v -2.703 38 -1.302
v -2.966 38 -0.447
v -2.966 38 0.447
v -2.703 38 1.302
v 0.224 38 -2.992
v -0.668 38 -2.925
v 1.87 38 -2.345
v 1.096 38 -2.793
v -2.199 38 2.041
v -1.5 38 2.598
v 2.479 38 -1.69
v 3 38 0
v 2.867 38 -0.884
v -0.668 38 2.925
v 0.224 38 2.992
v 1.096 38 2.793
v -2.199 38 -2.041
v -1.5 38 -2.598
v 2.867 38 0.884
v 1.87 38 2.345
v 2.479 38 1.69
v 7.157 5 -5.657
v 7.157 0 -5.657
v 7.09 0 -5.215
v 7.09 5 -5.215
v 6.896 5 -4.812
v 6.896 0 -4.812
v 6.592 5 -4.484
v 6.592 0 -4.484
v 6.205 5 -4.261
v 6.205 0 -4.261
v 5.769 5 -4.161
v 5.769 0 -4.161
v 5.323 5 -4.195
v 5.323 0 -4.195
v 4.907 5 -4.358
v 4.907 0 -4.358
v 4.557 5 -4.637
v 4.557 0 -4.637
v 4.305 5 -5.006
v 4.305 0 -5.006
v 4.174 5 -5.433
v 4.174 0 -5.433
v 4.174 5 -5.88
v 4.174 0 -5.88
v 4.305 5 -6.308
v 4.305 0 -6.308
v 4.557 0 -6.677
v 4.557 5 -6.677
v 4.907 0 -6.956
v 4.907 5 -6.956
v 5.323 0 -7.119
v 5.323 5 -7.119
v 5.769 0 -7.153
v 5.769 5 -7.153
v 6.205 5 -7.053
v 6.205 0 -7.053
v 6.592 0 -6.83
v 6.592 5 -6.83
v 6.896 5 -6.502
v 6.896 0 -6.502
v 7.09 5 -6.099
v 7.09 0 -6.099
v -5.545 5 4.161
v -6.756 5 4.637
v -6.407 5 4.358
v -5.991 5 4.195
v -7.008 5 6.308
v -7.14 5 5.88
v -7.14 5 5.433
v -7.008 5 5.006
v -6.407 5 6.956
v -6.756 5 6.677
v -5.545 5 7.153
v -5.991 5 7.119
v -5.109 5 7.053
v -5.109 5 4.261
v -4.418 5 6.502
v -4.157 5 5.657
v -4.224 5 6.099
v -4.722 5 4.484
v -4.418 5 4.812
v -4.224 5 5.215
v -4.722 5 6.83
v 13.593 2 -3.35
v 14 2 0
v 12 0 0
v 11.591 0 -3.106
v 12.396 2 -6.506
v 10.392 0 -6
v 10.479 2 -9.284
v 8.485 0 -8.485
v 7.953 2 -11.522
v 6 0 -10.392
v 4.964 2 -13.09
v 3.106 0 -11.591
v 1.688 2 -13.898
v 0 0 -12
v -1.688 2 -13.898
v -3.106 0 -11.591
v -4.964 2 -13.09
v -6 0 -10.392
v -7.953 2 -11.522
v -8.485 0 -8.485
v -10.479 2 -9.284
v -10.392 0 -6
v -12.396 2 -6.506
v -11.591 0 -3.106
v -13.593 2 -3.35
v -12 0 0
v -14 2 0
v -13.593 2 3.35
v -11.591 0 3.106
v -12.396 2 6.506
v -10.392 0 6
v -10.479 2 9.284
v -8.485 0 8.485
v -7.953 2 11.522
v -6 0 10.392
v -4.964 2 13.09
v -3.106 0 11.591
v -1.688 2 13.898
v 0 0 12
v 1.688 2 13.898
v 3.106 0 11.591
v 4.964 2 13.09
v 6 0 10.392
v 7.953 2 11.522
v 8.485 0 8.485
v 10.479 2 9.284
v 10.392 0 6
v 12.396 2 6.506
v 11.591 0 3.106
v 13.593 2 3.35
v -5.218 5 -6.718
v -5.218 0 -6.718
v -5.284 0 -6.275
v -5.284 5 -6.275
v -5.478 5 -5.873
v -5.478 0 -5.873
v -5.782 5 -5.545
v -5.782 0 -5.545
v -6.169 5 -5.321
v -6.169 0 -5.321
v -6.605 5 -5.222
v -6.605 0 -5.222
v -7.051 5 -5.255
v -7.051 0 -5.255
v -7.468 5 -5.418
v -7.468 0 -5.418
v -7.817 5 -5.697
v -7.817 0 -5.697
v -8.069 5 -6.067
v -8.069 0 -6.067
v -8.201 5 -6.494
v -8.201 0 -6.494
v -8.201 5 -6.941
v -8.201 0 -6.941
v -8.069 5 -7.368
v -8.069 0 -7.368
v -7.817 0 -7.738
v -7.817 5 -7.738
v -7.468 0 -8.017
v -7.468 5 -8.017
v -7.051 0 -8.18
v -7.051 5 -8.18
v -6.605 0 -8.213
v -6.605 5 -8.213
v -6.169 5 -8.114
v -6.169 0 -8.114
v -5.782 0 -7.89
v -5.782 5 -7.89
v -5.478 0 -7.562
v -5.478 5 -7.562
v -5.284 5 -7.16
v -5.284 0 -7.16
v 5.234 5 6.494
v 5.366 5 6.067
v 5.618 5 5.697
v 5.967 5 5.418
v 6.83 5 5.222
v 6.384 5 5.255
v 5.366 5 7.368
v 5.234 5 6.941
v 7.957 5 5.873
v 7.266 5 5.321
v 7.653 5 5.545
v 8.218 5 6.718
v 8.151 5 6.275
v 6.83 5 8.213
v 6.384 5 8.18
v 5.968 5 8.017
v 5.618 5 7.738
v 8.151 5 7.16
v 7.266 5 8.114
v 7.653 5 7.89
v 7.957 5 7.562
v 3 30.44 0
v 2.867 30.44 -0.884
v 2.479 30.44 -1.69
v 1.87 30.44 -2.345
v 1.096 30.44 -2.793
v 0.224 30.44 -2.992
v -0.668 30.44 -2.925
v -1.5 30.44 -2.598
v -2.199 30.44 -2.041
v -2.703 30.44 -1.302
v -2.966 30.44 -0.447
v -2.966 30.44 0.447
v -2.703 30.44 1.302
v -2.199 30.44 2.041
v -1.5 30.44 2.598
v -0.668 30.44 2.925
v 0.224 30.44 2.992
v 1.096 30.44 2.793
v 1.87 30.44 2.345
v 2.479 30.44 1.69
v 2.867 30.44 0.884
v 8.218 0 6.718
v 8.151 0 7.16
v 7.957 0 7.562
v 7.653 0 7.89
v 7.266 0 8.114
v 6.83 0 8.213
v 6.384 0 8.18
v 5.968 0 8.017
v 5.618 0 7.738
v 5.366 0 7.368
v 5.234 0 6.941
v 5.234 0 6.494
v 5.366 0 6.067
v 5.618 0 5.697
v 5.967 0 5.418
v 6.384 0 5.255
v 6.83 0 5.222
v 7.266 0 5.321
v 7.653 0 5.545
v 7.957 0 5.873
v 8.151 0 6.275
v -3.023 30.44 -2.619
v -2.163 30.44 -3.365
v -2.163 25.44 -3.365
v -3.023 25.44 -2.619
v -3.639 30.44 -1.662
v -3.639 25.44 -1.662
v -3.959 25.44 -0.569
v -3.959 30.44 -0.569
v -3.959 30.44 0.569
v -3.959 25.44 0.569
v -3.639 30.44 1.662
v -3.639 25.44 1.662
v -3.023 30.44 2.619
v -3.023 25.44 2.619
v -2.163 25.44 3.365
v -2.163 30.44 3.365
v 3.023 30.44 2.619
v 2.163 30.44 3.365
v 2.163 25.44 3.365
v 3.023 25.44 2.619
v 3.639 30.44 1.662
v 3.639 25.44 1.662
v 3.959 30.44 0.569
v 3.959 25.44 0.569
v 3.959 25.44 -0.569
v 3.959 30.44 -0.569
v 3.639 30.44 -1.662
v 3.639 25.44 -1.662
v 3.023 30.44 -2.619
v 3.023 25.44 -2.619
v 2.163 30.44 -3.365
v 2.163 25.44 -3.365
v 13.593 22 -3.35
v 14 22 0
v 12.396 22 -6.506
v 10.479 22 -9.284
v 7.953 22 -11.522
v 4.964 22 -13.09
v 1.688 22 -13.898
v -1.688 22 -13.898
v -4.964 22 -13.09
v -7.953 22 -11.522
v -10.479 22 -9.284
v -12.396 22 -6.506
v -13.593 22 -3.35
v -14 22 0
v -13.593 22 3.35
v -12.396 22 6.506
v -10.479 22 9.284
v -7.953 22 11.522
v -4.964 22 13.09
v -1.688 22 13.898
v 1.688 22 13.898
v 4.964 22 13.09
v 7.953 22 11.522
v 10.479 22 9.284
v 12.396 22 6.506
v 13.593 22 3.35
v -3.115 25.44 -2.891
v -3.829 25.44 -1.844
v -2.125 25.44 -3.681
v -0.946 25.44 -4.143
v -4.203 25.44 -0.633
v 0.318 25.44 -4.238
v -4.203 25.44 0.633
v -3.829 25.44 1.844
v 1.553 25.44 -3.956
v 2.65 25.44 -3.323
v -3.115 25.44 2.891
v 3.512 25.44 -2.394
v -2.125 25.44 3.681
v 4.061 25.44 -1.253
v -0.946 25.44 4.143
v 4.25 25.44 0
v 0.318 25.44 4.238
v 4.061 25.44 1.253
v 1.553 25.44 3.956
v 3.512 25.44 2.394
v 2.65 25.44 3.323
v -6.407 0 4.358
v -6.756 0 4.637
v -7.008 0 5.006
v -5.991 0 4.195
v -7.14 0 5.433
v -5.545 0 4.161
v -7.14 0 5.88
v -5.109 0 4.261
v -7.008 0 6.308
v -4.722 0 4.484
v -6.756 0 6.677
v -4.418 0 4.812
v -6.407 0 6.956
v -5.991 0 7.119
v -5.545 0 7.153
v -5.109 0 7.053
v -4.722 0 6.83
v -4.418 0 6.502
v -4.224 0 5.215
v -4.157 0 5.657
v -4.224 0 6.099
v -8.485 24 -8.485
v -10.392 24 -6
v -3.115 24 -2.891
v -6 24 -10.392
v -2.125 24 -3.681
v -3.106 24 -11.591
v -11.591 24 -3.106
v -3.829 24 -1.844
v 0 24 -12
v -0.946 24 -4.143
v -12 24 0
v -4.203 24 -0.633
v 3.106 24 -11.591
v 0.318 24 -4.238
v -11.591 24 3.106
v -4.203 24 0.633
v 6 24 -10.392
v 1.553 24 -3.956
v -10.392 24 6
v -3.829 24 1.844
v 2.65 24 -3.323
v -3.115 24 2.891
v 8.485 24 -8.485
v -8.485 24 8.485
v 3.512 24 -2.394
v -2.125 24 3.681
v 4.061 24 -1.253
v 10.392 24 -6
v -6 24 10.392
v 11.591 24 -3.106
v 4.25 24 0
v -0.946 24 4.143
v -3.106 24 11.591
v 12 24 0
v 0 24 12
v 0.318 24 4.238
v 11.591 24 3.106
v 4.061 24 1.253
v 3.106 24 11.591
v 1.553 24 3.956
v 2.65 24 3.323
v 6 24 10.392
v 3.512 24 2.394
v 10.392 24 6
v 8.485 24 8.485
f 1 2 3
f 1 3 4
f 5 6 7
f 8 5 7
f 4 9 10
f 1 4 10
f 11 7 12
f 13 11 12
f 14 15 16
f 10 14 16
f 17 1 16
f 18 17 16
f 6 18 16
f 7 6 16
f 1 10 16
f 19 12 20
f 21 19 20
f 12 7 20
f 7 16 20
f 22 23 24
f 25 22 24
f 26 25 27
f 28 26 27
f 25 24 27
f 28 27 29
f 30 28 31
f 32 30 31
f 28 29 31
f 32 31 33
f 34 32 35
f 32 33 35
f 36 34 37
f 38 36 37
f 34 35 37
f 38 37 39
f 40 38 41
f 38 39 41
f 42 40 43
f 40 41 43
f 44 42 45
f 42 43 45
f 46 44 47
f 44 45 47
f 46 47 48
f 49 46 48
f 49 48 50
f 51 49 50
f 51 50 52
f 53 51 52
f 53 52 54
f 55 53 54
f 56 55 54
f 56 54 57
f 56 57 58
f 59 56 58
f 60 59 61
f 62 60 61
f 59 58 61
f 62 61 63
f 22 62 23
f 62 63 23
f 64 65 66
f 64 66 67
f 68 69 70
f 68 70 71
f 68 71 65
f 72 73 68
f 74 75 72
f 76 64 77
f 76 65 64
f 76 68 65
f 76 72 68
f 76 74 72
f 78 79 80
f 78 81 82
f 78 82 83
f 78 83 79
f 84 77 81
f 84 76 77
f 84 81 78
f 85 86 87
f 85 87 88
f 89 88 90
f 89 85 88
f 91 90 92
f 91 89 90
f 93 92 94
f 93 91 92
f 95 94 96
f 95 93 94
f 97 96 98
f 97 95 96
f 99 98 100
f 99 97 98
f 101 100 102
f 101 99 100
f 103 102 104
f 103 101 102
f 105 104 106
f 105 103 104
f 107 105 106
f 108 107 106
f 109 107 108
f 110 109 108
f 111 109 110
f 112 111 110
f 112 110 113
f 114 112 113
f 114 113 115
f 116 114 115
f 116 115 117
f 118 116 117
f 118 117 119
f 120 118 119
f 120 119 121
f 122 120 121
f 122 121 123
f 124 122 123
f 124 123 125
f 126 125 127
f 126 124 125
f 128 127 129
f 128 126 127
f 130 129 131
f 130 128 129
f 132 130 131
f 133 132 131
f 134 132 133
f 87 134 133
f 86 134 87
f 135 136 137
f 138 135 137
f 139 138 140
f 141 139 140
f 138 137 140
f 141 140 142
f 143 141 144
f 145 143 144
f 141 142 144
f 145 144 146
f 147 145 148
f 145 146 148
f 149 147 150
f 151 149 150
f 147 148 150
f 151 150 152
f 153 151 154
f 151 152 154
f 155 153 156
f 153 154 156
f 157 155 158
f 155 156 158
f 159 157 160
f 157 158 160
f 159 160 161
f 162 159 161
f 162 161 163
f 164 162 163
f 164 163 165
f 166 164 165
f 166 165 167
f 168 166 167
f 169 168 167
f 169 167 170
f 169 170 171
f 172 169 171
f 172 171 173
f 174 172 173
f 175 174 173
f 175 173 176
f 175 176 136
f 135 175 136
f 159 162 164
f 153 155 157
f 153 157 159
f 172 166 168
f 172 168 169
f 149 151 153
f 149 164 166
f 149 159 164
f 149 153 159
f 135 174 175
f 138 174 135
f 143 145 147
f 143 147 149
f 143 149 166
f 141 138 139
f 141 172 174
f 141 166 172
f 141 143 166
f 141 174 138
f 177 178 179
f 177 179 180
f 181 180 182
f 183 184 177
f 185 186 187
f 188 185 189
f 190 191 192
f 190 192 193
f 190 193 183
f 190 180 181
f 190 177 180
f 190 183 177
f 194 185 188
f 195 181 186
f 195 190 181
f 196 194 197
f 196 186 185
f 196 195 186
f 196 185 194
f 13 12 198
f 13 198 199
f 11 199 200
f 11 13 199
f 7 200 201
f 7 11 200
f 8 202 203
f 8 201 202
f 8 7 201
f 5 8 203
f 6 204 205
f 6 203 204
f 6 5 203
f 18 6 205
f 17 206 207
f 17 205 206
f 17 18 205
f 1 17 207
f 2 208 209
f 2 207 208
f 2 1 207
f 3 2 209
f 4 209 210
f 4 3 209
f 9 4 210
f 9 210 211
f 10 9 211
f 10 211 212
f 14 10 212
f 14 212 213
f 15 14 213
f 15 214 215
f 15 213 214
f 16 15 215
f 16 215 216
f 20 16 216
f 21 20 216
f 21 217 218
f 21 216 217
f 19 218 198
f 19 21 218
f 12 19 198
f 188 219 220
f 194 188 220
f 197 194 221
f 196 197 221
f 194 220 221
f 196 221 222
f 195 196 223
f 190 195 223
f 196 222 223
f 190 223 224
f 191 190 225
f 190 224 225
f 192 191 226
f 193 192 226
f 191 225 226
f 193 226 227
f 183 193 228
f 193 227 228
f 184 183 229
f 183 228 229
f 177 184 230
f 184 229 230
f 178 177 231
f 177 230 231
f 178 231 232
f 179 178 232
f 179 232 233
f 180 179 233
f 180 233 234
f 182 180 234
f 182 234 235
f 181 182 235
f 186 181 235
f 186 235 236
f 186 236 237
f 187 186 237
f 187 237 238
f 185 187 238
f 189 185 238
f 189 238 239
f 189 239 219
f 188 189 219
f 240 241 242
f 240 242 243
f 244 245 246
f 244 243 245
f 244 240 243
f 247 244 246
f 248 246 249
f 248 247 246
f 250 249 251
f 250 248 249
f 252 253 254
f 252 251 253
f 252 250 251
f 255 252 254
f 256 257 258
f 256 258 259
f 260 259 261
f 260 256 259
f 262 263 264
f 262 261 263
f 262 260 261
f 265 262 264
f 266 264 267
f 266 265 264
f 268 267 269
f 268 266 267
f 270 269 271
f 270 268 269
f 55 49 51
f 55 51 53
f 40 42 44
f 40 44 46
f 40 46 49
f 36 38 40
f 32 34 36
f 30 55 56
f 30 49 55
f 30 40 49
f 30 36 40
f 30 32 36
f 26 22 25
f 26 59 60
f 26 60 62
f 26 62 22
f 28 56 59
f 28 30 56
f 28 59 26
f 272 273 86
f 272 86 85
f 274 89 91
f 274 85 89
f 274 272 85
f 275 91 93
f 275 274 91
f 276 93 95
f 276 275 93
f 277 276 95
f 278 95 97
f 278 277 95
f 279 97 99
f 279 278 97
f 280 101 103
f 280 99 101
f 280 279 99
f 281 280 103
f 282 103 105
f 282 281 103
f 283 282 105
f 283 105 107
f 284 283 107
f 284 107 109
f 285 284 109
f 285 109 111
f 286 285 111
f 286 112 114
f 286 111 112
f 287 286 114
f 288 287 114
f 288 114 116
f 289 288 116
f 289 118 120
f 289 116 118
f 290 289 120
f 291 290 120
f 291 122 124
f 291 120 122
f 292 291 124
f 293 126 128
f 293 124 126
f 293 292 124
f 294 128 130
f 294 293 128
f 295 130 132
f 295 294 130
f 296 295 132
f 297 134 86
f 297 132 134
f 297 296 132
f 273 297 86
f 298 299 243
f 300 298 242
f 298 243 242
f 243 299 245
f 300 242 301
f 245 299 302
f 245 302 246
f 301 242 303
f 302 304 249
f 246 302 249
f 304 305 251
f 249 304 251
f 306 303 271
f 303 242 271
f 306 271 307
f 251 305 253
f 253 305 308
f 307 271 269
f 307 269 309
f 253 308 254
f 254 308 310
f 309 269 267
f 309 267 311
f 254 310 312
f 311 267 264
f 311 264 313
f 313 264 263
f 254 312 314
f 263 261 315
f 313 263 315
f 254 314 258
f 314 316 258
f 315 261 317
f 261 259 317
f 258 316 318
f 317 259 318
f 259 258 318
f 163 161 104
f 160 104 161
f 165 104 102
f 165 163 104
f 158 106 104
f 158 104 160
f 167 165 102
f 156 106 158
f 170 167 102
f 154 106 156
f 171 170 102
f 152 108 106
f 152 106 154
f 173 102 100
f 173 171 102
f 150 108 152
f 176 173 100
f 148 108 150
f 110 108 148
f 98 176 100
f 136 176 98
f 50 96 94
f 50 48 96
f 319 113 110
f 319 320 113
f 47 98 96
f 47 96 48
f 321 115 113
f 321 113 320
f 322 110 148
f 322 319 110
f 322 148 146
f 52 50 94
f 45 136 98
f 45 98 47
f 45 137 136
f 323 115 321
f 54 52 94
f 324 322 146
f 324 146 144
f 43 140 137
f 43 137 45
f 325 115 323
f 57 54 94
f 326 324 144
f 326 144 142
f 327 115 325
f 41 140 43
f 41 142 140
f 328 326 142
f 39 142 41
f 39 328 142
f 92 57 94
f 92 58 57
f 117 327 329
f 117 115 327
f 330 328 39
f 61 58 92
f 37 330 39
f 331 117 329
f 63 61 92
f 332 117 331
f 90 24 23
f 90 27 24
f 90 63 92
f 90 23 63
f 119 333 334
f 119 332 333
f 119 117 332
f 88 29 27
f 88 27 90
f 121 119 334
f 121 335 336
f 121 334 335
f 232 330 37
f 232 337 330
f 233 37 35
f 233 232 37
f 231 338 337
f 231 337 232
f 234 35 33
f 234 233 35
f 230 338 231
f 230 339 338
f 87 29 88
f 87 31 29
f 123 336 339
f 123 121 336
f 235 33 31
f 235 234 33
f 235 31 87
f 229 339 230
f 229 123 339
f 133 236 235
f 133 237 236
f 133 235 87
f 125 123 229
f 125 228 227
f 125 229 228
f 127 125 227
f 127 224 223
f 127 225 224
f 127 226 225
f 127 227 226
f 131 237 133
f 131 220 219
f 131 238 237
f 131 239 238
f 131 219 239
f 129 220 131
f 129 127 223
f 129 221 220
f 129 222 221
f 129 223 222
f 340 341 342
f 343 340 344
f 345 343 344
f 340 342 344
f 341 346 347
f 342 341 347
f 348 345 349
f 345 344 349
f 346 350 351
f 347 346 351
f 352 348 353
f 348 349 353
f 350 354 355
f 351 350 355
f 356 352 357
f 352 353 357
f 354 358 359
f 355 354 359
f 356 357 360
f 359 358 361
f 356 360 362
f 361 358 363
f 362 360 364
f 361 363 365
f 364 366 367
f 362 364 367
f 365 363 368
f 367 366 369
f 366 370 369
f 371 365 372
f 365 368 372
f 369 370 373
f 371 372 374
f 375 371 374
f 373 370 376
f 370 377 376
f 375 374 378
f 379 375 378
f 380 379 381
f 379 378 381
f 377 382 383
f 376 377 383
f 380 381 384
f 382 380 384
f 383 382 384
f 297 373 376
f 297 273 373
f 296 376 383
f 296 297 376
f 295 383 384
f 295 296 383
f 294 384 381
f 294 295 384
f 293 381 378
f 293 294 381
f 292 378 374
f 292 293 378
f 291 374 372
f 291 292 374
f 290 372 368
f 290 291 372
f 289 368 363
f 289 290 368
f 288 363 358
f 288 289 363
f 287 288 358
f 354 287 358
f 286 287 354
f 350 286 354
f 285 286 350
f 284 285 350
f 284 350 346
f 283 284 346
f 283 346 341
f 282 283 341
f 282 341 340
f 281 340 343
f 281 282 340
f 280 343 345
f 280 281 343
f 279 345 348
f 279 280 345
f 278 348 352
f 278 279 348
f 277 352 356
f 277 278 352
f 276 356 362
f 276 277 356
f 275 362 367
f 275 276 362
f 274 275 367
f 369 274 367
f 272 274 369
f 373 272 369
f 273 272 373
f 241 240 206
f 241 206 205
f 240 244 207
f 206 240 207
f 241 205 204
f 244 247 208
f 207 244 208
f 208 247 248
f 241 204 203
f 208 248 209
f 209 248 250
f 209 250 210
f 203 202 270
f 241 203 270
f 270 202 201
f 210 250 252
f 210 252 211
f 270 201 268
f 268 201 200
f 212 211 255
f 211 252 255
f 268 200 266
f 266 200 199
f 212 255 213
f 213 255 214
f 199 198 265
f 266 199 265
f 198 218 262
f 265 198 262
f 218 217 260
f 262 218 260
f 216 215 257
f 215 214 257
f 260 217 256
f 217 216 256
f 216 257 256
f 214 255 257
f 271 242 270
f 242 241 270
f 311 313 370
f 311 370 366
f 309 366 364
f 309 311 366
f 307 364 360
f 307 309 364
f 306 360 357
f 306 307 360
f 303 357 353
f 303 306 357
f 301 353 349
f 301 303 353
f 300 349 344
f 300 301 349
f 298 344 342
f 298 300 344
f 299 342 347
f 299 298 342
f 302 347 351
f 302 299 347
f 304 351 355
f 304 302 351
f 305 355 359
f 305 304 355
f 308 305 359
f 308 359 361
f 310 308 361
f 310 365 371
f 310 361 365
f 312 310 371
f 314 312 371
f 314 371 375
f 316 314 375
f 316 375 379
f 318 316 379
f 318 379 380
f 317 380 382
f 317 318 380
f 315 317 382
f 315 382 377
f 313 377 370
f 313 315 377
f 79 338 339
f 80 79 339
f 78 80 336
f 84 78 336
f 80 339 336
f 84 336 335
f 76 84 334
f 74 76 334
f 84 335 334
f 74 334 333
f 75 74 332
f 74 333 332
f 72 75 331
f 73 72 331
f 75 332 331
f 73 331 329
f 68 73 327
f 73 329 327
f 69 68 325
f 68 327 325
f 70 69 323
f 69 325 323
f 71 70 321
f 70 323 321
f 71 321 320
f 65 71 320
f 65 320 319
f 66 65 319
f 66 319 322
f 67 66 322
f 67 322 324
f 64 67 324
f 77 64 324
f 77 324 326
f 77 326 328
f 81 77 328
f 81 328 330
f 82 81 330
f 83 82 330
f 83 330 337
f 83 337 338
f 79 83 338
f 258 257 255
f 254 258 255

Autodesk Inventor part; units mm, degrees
ref_plane "YZ Plane" through (0, 0, 0) normal (1, 0, 0) x (0, 1, 0)
ref_plane "XZ Plane" through (0, 0, 0) normal (0, 1, 0) x (-1, 0, 0)
ref_plane "XY Plane" through (0, 0, 0) normal (0, 0, 1) x (1, 0, 0)
sketch "Sketch1" plane through (0, 0, 0) normal (0, 0, 1) x (1, 0, 0)
  line L0 (0, 0) -> (14, 0)
  line L1 (14, 0) -> (14, 24)
  line L2 (14, 24) -> (4.25, 24)
  line L3 (4.25, 24) -> (4.25, 25.4397)
  line L4 (4.25, 25.4397) -> (4, 25.4397)
  line L5 (3, 38) -> (0, 38)
  line L6 (0, 38) -> (0, 0)
  line L7 (4, 25.4397) -> (4, 30.4397)
  line L8 (4, 30.4397) -> (3, 30.4397)
  line L9 (3, 30.4397) -> (3, 38)
  dimension "d0" = 28
  dimension "d1" = 24
  dimension "d2" = 5
  dimension "d3" = 8
  dimension "d4" = 6
  dimension "d5" = 8.5
  dimension "d6" = 38
revolve "Revolution1" add sketch "Sketch1" angle 360 about axis through (0, 38, 0) along (0, -1, 0)
chamfer "Chamfer1" distance 2 angle 45 2 edges at (-14, 0, 0) (-14, 24, 0)
thread "Thread1" size "M6x1" class "6g" standard "ANSI Metric M Profile" full length
sketch "Sketch2" plane through (0, 30.4397, 0) normal (0, 1, 0) x (1, 0, 0)
  line L0 (-2.1626, 3.365) -> (2.1626, 3.365)
  line L1 (2.1626, 3.365) -> (2.1626, -3.365)
  line L2 (2.1626, -3.365) -> (-2.1626, -3.365)
  line L3 (-2.1626, -3.365) -> (-2.1626, 3.365)
  circle A0 centre (0, 0) radius 3 projected
  circle A1 centre (0, 0) radius 4 projected
  point P0 (2.1626, 0)
  dimension "d13" = 6.73
extrude "Extrusion1" cut sketch "Sketch2" against normal blind 5 contours A1 L0 | L2 A1
sketch "Sketch4" plane through (0, 0, 0) normal (0, -1, 0) x (1, 0, 0)
  circle A0 centre (6.7175, 6.7175) radius 1.5
  circle A1 centre (-6.7175, -6.7175) radius 1.5
  circle A2 centre (-5.6569, 5.6569) radius 1.5
  circle A3 centre (5.6569, -5.6569) radius 1.5
  line L0 (-6.7175, -6.7175) -> (6.7175, 6.7175) construction
  line L1 (-5.6569, 5.6569) -> (5.6569, -5.6569) construction
  line L2 (0, 0) -> (0, 11.5514) construction
  point P0 (0, 0)
  dimension "d20" = 3
  dimension "d21" = 19
  dimension "d22" = 16
  dimension "d23" = 45
extrude "Extrusion3" cut sketch "Sketch4" against normal blind 5
properties part number "Unmodified Motor"
